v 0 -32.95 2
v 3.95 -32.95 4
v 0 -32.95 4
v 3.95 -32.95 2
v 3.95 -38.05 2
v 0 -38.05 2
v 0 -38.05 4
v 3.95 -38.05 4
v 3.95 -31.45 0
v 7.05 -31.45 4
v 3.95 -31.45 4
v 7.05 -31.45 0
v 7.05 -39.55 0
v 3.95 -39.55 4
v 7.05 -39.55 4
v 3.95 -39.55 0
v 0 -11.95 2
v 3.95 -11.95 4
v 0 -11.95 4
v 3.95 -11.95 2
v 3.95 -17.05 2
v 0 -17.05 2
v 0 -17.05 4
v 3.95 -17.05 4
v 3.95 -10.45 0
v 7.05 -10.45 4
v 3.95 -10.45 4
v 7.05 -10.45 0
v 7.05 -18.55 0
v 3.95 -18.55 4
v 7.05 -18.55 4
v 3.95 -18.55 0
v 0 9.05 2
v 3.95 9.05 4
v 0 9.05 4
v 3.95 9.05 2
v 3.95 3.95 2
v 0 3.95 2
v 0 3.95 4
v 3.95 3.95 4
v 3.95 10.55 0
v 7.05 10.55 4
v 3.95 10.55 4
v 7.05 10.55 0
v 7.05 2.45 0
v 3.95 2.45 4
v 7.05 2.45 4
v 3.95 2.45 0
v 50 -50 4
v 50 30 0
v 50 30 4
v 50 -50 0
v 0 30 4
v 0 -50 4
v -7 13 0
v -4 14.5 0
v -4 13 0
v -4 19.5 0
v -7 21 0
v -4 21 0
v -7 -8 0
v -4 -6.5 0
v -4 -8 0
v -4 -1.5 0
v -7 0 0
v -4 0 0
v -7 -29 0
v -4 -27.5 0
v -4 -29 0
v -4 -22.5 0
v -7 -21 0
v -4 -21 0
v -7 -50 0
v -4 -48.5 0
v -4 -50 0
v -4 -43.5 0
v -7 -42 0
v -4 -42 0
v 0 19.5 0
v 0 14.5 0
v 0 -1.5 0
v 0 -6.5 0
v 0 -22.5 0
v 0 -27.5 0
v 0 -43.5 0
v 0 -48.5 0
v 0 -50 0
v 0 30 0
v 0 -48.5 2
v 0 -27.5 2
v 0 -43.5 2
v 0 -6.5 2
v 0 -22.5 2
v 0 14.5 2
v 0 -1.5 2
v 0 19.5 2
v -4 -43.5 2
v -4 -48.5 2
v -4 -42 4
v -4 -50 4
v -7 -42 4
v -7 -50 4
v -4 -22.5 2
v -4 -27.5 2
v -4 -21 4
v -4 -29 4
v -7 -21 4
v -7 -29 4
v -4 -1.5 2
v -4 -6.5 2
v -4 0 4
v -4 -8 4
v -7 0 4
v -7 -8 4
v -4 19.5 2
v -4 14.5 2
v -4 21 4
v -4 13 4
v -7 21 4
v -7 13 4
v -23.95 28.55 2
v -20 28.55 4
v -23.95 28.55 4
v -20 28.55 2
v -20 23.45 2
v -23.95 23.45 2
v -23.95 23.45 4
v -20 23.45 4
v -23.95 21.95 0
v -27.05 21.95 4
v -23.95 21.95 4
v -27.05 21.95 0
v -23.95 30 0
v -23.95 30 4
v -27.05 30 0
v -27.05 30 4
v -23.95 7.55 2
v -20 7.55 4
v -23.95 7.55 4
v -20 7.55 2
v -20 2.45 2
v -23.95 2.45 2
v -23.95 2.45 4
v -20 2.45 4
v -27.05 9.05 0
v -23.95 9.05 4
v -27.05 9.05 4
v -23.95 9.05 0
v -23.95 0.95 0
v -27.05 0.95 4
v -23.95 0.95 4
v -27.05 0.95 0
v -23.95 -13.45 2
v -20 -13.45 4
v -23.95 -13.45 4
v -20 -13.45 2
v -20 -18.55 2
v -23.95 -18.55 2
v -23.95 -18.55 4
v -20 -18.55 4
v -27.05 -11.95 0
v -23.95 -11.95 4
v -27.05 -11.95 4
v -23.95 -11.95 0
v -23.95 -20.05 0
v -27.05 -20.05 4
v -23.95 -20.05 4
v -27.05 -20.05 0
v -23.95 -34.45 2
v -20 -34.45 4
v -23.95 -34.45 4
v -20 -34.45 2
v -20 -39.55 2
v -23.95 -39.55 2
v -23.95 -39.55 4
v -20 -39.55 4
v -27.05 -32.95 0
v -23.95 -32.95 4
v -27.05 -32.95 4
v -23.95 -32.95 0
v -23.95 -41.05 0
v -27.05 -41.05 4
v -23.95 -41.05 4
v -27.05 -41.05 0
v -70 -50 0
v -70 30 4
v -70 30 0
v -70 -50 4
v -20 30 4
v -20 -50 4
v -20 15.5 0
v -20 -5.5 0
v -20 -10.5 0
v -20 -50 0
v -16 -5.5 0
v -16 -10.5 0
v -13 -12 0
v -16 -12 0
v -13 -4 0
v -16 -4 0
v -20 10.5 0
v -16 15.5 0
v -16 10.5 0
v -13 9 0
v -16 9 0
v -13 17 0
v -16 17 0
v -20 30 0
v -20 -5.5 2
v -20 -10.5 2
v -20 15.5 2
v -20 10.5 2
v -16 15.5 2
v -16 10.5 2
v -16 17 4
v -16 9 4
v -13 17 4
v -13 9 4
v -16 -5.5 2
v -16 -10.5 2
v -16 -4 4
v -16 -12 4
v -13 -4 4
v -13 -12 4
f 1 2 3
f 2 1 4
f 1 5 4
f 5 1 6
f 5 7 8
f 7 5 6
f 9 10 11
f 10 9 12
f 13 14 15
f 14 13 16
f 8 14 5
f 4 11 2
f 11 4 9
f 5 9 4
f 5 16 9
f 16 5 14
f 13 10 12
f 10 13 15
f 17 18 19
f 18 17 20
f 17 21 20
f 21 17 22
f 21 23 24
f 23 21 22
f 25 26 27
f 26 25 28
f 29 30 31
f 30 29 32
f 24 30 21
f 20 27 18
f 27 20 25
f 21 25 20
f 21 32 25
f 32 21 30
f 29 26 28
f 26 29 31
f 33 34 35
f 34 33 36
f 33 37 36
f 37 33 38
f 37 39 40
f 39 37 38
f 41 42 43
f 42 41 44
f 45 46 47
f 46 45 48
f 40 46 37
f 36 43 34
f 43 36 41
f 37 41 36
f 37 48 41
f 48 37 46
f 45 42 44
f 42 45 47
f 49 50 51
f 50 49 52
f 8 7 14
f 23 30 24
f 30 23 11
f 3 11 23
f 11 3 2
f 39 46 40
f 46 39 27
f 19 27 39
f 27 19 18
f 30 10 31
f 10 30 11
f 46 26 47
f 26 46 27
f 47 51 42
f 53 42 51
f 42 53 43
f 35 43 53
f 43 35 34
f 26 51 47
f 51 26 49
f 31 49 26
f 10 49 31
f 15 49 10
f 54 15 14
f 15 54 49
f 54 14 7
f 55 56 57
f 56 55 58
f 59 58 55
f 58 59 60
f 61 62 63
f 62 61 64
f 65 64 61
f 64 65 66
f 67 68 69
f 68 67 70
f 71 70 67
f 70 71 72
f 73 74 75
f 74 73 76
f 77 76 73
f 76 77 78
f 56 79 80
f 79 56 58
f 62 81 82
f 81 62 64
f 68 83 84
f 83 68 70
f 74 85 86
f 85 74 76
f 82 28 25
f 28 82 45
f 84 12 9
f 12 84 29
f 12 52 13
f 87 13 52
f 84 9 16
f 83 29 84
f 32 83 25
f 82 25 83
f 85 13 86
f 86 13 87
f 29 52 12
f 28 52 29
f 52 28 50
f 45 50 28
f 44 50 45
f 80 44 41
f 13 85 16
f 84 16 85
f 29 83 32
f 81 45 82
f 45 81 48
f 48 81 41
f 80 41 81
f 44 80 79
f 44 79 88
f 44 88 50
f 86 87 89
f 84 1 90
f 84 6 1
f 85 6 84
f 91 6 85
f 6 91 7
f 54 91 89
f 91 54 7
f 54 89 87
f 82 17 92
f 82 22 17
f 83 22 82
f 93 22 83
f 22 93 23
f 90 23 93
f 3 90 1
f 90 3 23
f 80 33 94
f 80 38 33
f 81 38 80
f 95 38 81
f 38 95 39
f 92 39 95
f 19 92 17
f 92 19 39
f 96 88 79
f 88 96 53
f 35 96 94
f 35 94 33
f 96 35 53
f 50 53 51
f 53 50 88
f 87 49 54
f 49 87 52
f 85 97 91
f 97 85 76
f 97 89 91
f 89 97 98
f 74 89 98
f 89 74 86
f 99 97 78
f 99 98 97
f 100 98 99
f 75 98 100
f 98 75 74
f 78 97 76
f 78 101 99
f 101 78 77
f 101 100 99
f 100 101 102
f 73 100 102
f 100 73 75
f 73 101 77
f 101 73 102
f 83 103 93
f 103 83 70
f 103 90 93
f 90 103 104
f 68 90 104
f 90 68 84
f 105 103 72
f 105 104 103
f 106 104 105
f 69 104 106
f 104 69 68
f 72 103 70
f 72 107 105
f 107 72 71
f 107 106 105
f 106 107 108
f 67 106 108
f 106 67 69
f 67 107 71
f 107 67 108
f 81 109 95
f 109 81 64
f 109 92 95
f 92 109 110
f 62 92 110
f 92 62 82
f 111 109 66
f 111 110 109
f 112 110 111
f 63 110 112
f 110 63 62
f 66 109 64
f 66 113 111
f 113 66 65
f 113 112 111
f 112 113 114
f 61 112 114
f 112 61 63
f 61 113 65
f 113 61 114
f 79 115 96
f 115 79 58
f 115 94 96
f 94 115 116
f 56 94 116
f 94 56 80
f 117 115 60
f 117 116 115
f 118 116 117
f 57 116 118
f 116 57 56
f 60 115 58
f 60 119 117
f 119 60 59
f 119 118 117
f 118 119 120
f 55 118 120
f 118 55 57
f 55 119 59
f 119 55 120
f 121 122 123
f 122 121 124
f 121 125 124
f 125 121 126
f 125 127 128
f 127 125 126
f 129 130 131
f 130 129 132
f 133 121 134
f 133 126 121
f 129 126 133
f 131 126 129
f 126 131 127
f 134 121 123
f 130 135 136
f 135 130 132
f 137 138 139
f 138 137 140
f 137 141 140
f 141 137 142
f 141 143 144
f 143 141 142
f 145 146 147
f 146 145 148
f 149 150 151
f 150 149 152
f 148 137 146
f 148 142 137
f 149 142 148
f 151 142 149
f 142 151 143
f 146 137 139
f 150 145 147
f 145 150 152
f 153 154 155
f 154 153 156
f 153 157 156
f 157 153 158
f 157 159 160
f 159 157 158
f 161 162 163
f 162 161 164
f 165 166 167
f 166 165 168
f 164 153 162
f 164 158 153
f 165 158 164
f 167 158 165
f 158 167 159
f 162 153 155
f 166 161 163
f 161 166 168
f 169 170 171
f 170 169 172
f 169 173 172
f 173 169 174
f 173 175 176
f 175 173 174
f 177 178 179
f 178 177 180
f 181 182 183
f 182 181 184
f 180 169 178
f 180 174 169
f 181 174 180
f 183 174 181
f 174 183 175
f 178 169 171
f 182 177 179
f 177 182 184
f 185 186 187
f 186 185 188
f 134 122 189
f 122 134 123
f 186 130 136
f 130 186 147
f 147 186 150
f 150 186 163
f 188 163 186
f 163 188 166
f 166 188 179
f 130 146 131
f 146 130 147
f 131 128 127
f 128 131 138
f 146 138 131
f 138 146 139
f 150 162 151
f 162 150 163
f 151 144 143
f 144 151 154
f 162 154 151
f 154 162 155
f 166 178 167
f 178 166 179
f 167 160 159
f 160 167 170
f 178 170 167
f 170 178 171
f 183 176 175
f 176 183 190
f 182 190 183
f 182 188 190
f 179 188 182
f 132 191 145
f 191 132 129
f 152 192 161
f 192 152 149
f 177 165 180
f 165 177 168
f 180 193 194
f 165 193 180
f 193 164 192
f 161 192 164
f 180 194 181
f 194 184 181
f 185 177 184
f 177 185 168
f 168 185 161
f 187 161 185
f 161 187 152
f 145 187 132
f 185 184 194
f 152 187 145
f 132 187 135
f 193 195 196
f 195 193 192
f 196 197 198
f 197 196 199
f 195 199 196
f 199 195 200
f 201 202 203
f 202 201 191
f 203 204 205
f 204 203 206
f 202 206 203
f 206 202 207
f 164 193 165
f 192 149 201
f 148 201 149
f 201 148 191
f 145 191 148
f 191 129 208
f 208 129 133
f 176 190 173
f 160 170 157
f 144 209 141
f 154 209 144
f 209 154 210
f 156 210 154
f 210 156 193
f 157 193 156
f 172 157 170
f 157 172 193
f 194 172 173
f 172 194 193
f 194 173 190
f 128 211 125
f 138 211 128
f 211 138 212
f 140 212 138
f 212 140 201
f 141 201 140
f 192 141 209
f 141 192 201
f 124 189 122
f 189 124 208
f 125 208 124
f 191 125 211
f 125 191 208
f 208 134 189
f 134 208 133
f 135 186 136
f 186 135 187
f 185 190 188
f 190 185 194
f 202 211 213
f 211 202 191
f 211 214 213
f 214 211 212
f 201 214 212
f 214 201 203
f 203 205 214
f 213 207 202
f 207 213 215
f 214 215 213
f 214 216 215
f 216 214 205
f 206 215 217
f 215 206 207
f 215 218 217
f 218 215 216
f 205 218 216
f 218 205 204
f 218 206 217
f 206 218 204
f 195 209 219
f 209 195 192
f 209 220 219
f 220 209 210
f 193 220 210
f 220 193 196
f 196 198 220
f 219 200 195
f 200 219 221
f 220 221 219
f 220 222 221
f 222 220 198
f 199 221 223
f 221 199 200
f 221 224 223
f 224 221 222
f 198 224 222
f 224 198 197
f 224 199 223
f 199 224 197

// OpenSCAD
// file: flat-panel-joint.scad
/* 
 * Based on a work at https://skfb.ly/p8Zyr.
 * "Flat panel joint part 1" (https://skfb.ly/p8Zyr) by payo@TensileCreator is licensed under Creative Commons Attribution-NonCommercial (http://creativecommons.org/licenses/by-nc/4.0/).
 */

/*
 * Usage example:
 * add_seam_to(joint_count = 7, translate_seam = [0, -50, 0], rotate_seam = [0, 0, 90]) {
 *   translate([0, -50, 0])
 *   cube([50, 80, 4]);
 * };
 *
 * mirror([1, 0, 0]) {
 *   add_seam_to(joint_count = 7, translate_seam = [20, 30, 0], rotate_seam = [0, 0, 270], invert_seam = true) {
 *     translate([20, -50, 0])
 *     cube([50, 80, 4]);
 *   };
 * };
 */
module add_seam_to(joint_count, translate_seam = [0, 0, 0], rotate_seam = [0, 0, 0], scale_xy = 1, z_height = 4, invert_seam = false) {
    joint_spacing=21;
    tolerance=0.05;
    first_iteration_count = ceil(joint_count / 2) - 1;
    second_iteration_count = max(floor(joint_count / 2) - 1, 0);

    union() {
        difference() {
            children(0);
            if (invert_seam || joint_count > 1) {
                translate(translate_seam)
                rotate(rotate_seam)
                for (i=[0:(invert_seam ? first_iteration_count : second_iteration_count)]) {
                    translate([(i * joint_spacing * scale_xy) + (invert_seam ? (8 * scale_xy) : (10.5 * scale_xy)), 0, 0])
                    rotate([0, 0, invert_seam ? 180 : 0])
                    union() {
                        translate([1.5 * scale_xy - tolerance, -4 * scale_xy, z_height / 2])
                        cube([5 * scale_xy + (tolerance*2), 4 * scale_xy + tolerance, (z_height / 2) + tolerance]);
                        translate([0 - tolerance, -7 * scale_xy - tolerance, 0 - tolerance])
                        cube([8 * scale_xy + (tolerance*2), 3 * scale_xy + (tolerance*2), z_height + (tolerance*2)]);
                    }
                }
            }
        }
        if (!invert_seam || joint_count > 1) {
            translate(translate_seam)
            rotate(rotate_seam)
            for (i=[(invert_seam ? 1 : 0):(invert_seam ? second_iteration_count : first_iteration_count)]) {
                translate([(i * joint_spacing * scale_xy), 0, 0])
                rotate([0, 0, invert_seam ? 180 : 0])
                union() {
                    translate([1.5 * scale_xy, 0, 0])
                    cube([5 * scale_xy, 4 * scale_xy, (z_height / 2)]);
                    translate([0, 4 * scale_xy, 0])
                    cube([8 * scale_xy, 3 * scale_xy, z_height]);
                }
            }
        }
    }
}
// main file
use <flat-panel-joint.scad>;

add_seam_to(joint_count = 7, translate_seam = [0, -50, 0], rotate_seam = [0, 0, 90]) {
    translate([0, -50, 0])
    cube([50, 80, 4]);
};

mirror([1, 0, 0]) {
    add_seam_to(joint_count = 7, translate_seam = [20, 30, 0], rotate_seam = [0, 0, 270], invert_seam = true) {
        translate([20, -50, 0])
        cube([50, 80, 4]);
    };
};
